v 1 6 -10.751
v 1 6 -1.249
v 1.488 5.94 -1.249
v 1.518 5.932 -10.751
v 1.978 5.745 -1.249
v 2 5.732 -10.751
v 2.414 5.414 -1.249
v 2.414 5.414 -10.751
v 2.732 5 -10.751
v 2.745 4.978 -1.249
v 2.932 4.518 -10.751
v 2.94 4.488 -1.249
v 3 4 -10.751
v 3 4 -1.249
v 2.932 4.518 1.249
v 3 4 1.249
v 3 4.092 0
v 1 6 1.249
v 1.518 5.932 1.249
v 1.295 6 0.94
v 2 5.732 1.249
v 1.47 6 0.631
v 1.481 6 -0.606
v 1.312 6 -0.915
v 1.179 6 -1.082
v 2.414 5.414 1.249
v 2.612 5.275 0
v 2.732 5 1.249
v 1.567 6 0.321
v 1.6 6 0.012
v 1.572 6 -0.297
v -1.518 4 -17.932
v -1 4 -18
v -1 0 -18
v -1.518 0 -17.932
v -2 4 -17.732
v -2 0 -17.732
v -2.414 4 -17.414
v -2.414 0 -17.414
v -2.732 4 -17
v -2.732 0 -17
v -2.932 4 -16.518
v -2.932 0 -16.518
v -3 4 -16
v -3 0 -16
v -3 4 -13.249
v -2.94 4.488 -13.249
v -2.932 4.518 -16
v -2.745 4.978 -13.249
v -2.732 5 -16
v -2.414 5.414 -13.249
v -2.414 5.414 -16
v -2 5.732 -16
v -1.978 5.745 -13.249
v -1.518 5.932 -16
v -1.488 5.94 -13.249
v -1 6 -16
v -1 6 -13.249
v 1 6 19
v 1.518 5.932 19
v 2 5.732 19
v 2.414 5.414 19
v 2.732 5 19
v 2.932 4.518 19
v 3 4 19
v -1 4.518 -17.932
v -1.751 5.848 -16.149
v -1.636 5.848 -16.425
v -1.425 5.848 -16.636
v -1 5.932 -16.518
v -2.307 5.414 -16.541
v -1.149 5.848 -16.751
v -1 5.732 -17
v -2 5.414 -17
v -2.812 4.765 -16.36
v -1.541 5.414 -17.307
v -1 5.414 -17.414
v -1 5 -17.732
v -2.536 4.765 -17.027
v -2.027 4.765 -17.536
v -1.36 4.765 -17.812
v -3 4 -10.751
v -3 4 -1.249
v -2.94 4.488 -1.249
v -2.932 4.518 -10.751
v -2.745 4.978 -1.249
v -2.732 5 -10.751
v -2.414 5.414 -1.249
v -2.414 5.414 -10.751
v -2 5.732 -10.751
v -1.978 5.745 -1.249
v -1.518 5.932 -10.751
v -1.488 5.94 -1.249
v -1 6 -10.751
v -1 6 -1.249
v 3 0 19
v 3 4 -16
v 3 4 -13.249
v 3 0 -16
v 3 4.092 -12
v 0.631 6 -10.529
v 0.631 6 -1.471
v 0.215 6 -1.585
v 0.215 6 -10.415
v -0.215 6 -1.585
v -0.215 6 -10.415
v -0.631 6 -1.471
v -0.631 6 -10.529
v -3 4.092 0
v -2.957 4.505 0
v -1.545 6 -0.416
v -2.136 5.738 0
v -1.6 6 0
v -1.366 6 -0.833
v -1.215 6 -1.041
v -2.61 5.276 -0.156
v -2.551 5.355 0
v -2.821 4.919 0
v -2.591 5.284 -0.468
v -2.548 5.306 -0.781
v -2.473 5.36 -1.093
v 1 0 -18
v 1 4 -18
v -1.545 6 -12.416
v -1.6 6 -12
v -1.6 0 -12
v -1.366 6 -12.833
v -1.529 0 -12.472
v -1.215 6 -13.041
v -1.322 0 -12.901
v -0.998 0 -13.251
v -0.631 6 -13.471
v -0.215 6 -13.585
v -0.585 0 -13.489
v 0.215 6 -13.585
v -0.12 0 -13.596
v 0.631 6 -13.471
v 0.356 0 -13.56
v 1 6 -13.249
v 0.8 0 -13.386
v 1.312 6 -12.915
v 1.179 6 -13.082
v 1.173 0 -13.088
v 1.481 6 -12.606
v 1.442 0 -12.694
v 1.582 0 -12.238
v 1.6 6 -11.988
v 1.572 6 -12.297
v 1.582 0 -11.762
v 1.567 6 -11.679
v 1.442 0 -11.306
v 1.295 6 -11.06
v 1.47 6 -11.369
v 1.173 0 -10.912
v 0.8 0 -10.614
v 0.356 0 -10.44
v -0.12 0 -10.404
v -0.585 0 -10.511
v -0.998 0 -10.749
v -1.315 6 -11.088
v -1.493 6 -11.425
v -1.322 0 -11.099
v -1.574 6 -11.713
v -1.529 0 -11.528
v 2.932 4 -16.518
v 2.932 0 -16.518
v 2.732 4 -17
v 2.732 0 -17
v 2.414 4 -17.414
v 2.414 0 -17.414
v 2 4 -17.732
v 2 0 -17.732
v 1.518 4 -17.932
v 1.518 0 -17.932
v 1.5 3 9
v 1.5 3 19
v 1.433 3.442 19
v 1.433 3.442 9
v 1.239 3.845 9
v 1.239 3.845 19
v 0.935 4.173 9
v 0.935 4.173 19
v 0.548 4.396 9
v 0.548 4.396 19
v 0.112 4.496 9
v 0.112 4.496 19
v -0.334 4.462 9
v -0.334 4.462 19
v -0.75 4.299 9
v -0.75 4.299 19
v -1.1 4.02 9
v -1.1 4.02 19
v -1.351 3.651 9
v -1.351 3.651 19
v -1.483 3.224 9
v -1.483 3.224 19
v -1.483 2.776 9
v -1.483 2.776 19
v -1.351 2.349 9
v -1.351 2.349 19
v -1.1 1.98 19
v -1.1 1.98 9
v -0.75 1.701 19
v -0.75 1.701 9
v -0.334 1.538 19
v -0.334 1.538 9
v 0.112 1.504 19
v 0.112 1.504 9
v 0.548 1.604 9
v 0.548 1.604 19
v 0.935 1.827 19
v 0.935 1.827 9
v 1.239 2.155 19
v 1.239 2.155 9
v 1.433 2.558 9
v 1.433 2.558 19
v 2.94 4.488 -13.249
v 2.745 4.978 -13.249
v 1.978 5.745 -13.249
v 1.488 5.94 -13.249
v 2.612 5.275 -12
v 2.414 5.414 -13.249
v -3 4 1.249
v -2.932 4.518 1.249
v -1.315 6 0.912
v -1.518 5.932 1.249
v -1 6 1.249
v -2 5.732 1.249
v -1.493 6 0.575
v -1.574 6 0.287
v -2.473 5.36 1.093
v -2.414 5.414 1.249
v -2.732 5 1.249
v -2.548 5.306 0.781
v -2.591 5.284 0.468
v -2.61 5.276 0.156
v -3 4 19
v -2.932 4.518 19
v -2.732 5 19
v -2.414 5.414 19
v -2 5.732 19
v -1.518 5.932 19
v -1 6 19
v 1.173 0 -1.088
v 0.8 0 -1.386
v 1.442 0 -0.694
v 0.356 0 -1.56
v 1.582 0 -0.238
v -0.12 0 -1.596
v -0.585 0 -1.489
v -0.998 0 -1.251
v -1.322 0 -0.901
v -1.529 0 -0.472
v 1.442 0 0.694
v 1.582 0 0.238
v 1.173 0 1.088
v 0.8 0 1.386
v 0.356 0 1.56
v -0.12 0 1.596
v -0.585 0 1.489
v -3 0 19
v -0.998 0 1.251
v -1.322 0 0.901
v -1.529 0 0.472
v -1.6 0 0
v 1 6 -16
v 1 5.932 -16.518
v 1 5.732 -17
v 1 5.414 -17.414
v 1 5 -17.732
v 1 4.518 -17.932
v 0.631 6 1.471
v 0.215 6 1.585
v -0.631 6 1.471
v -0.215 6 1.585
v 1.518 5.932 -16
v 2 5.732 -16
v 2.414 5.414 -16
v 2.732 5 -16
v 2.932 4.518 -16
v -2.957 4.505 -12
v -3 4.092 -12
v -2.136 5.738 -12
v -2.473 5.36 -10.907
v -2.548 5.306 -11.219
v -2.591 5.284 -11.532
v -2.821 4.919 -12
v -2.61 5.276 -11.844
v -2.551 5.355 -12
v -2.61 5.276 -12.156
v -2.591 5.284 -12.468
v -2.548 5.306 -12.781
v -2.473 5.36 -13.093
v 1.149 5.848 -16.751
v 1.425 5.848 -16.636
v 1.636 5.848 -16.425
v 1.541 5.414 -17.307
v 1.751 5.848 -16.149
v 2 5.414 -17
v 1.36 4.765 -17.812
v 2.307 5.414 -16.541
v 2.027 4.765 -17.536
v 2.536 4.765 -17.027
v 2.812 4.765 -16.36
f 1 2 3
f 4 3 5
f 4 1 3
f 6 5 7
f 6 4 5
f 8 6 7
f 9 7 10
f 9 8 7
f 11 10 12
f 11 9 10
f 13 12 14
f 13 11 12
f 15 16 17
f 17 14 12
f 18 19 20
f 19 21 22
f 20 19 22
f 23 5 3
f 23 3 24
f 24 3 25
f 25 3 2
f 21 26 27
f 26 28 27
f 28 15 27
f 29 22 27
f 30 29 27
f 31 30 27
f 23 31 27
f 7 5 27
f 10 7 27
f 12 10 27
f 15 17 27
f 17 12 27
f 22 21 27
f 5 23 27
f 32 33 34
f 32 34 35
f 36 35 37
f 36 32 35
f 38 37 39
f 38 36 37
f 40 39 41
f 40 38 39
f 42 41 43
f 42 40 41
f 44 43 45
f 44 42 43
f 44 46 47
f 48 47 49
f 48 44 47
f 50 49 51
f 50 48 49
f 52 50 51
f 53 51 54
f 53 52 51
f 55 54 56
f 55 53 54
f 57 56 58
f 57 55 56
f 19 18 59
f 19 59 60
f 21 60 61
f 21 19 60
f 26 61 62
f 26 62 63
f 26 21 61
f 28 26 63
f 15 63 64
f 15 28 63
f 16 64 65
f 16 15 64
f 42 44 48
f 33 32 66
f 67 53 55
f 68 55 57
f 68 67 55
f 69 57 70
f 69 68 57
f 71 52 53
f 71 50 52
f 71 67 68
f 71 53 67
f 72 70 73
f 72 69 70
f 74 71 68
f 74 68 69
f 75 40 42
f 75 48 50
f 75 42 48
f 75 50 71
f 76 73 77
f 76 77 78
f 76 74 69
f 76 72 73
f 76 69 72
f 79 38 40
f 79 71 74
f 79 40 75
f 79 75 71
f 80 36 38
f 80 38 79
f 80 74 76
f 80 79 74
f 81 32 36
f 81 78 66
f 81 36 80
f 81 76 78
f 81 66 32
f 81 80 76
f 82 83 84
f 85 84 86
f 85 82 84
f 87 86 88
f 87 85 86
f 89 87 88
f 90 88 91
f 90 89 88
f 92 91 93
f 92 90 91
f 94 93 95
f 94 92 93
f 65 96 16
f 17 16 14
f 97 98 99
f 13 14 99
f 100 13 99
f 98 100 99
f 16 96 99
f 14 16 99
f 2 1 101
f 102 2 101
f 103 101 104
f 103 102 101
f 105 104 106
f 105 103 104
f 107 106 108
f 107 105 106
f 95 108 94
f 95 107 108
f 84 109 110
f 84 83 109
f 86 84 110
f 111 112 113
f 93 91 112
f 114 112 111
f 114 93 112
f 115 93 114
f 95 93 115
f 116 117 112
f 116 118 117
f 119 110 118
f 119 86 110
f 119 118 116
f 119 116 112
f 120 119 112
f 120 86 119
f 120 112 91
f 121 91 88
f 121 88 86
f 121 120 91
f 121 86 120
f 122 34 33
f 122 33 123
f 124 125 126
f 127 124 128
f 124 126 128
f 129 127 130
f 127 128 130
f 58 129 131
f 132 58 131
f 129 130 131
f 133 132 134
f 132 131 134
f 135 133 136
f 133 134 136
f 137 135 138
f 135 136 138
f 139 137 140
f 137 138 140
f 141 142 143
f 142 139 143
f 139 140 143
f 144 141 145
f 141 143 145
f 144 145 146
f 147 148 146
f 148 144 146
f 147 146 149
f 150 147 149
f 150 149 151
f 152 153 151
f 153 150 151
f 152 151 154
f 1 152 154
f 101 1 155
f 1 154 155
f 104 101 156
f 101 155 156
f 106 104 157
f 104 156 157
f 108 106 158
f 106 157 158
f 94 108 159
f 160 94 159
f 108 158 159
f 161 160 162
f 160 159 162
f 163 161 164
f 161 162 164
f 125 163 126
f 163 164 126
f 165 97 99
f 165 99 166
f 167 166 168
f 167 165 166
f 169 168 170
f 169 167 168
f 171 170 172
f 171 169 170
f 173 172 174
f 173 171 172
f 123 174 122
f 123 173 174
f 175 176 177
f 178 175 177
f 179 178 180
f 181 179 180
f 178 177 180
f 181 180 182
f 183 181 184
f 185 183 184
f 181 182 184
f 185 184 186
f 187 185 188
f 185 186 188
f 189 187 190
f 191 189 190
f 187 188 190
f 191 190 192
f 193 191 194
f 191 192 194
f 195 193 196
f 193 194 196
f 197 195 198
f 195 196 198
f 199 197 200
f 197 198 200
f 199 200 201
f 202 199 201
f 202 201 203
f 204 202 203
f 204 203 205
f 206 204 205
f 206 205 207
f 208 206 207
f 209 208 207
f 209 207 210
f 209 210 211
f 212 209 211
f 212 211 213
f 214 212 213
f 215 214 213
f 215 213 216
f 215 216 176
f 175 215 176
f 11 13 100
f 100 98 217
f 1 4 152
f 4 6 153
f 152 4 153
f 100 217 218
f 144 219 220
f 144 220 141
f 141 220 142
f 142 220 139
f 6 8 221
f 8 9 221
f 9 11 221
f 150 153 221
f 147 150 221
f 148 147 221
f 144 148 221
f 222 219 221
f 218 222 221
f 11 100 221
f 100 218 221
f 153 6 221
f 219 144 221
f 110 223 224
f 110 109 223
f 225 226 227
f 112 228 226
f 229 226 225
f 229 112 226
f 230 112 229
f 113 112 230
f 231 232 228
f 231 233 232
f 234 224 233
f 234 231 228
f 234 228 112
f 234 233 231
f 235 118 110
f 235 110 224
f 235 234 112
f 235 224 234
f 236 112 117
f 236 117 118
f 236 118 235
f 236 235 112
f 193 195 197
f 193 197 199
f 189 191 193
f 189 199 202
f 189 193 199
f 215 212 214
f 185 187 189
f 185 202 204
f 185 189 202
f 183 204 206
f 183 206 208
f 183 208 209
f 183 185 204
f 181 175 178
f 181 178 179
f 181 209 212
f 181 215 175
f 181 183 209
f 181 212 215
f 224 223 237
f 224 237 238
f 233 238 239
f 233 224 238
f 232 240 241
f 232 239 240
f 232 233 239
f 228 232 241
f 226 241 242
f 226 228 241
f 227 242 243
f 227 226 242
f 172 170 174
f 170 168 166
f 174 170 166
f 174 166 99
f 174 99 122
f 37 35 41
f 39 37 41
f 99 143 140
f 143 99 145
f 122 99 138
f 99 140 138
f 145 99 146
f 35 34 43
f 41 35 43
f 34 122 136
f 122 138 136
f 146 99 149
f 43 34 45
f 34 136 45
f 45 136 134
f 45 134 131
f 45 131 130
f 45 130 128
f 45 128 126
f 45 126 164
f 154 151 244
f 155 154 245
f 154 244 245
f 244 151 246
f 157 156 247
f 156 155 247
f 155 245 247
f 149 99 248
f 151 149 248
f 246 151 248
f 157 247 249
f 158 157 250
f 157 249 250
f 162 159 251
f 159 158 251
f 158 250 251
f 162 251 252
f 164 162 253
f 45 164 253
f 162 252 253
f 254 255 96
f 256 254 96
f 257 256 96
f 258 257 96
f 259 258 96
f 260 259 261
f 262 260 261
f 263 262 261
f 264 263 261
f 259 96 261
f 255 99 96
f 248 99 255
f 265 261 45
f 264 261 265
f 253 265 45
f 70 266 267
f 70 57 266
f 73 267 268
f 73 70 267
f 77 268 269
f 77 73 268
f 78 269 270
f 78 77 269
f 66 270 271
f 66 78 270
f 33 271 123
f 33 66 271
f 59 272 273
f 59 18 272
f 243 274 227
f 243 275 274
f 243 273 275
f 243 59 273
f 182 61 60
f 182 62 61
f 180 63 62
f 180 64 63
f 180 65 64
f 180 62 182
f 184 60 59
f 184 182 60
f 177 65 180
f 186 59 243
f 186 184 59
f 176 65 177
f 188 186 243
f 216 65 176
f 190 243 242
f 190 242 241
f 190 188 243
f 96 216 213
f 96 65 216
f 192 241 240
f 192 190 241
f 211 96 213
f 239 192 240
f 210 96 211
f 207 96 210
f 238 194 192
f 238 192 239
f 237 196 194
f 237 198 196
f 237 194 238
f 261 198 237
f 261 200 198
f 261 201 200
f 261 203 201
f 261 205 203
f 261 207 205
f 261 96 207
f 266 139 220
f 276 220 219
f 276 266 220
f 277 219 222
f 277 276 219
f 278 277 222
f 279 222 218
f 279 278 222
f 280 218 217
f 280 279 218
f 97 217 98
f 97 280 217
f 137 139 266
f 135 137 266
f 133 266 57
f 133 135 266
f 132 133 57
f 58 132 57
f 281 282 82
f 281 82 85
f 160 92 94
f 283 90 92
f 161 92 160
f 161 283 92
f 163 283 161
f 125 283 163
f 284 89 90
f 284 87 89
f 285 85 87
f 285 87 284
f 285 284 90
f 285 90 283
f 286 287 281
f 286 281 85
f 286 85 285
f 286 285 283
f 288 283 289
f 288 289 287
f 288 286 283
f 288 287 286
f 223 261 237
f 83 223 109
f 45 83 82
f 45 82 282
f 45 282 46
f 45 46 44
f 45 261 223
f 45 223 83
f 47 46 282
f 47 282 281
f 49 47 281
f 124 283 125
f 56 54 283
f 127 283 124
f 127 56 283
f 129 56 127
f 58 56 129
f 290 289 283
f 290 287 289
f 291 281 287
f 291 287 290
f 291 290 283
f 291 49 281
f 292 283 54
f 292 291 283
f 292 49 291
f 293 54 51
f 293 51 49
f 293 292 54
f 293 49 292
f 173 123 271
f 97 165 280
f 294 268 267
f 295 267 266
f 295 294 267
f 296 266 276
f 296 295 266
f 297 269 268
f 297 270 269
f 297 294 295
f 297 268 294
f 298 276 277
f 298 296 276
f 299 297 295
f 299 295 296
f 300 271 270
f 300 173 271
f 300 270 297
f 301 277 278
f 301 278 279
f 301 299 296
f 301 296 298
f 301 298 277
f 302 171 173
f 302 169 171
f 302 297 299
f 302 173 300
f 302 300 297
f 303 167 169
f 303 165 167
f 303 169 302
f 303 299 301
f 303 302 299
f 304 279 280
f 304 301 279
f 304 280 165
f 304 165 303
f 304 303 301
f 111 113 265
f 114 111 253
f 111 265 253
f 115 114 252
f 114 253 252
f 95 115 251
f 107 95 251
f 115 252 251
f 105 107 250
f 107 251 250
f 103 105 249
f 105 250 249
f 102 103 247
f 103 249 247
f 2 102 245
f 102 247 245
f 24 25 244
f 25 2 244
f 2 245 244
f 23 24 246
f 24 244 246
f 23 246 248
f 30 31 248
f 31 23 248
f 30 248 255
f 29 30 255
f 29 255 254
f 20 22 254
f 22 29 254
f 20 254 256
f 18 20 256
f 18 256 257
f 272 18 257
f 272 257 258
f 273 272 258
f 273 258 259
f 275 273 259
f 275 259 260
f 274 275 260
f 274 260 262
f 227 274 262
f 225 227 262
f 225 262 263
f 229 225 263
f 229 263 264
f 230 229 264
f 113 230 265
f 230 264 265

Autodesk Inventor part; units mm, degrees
ref_plane "YZ Plane" through (0, 0, 0) normal (1, 0, 0) x (0, 1, 0)
ref_plane "XZ Plane" through (0, 0, 0) normal (0, 1, 0) x (-1, 0, 0)
ref_plane "XY Plane" through (0, 0, 0) normal (0, 0, 1) x (1, 0, 0)
sketch "Sketch1" plane through (0, 0, 0) normal (0, 1, 0) x (-1, 0, 0)
  circle A0 centre (0, 0) radius 1.6
  circle A1 centre (0, -12) radius 1.6
  line L0 (0, 0) -> (0, 19)
  line L1 (0, 19) -> (-3, 19)
  line L2 (-3, 19) -> (-3, -18)
  line L3 (-3, -18) -> (0, -18)
  line L4 (0, -18) -> (0, 19)
  line L5 (0, 19) -> (3, 19)
  line L6 (3, 19) -> (3, -18)
  line L7 (3, -18) -> (0, -18)
  line L8 (0, -18) -> (0, 19)
  dimension "d0" = 3.2
  dimension "d1" = 3.2
  dimension "d2" = 12
  dimension "d3" = 19
  dimension "d7" = 3
  dimension "d8" = 3
extrude "Extrusion1" add sketch "Sketch1" along normal blind 6 contours A0 L0 L5 L6 L7 L4 A1 | A0 L4 A1 L3 L2 L1 L0
sketch "Sketch2" plane through (-3, 0, 19) normal (0, 0, 1) x (1, 0, 0)
  circle A0 centre (3, 3) radius 1.5
  point P0 (3, 0)
  dimension "d9" = 3
extrude "Extrusion2" cut sketch "Sketch2" against normal blind 10
fillet "Fillet1" radius 2 5 edges at (3, 3, -18) (-3, 3, -18) (0, 6, -18) (3, 6, 0.5) (-3, 6, 0.5)
properties part number "Holder Pendorong_3DPrint"
